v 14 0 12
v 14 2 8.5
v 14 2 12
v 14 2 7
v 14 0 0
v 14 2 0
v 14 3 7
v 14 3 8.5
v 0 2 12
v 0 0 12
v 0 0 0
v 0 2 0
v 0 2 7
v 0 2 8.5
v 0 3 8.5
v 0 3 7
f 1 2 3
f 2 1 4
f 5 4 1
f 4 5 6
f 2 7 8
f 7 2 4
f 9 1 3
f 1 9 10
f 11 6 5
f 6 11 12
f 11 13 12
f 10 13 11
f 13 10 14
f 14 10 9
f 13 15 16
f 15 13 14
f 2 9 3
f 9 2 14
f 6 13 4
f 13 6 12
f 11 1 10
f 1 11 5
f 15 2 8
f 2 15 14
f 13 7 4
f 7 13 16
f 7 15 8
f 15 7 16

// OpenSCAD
$fn=100;

union() {
  cube([14,2,12]);
  translate([0,2,7])
    cube([14,1,1.5]);
};
  
  
